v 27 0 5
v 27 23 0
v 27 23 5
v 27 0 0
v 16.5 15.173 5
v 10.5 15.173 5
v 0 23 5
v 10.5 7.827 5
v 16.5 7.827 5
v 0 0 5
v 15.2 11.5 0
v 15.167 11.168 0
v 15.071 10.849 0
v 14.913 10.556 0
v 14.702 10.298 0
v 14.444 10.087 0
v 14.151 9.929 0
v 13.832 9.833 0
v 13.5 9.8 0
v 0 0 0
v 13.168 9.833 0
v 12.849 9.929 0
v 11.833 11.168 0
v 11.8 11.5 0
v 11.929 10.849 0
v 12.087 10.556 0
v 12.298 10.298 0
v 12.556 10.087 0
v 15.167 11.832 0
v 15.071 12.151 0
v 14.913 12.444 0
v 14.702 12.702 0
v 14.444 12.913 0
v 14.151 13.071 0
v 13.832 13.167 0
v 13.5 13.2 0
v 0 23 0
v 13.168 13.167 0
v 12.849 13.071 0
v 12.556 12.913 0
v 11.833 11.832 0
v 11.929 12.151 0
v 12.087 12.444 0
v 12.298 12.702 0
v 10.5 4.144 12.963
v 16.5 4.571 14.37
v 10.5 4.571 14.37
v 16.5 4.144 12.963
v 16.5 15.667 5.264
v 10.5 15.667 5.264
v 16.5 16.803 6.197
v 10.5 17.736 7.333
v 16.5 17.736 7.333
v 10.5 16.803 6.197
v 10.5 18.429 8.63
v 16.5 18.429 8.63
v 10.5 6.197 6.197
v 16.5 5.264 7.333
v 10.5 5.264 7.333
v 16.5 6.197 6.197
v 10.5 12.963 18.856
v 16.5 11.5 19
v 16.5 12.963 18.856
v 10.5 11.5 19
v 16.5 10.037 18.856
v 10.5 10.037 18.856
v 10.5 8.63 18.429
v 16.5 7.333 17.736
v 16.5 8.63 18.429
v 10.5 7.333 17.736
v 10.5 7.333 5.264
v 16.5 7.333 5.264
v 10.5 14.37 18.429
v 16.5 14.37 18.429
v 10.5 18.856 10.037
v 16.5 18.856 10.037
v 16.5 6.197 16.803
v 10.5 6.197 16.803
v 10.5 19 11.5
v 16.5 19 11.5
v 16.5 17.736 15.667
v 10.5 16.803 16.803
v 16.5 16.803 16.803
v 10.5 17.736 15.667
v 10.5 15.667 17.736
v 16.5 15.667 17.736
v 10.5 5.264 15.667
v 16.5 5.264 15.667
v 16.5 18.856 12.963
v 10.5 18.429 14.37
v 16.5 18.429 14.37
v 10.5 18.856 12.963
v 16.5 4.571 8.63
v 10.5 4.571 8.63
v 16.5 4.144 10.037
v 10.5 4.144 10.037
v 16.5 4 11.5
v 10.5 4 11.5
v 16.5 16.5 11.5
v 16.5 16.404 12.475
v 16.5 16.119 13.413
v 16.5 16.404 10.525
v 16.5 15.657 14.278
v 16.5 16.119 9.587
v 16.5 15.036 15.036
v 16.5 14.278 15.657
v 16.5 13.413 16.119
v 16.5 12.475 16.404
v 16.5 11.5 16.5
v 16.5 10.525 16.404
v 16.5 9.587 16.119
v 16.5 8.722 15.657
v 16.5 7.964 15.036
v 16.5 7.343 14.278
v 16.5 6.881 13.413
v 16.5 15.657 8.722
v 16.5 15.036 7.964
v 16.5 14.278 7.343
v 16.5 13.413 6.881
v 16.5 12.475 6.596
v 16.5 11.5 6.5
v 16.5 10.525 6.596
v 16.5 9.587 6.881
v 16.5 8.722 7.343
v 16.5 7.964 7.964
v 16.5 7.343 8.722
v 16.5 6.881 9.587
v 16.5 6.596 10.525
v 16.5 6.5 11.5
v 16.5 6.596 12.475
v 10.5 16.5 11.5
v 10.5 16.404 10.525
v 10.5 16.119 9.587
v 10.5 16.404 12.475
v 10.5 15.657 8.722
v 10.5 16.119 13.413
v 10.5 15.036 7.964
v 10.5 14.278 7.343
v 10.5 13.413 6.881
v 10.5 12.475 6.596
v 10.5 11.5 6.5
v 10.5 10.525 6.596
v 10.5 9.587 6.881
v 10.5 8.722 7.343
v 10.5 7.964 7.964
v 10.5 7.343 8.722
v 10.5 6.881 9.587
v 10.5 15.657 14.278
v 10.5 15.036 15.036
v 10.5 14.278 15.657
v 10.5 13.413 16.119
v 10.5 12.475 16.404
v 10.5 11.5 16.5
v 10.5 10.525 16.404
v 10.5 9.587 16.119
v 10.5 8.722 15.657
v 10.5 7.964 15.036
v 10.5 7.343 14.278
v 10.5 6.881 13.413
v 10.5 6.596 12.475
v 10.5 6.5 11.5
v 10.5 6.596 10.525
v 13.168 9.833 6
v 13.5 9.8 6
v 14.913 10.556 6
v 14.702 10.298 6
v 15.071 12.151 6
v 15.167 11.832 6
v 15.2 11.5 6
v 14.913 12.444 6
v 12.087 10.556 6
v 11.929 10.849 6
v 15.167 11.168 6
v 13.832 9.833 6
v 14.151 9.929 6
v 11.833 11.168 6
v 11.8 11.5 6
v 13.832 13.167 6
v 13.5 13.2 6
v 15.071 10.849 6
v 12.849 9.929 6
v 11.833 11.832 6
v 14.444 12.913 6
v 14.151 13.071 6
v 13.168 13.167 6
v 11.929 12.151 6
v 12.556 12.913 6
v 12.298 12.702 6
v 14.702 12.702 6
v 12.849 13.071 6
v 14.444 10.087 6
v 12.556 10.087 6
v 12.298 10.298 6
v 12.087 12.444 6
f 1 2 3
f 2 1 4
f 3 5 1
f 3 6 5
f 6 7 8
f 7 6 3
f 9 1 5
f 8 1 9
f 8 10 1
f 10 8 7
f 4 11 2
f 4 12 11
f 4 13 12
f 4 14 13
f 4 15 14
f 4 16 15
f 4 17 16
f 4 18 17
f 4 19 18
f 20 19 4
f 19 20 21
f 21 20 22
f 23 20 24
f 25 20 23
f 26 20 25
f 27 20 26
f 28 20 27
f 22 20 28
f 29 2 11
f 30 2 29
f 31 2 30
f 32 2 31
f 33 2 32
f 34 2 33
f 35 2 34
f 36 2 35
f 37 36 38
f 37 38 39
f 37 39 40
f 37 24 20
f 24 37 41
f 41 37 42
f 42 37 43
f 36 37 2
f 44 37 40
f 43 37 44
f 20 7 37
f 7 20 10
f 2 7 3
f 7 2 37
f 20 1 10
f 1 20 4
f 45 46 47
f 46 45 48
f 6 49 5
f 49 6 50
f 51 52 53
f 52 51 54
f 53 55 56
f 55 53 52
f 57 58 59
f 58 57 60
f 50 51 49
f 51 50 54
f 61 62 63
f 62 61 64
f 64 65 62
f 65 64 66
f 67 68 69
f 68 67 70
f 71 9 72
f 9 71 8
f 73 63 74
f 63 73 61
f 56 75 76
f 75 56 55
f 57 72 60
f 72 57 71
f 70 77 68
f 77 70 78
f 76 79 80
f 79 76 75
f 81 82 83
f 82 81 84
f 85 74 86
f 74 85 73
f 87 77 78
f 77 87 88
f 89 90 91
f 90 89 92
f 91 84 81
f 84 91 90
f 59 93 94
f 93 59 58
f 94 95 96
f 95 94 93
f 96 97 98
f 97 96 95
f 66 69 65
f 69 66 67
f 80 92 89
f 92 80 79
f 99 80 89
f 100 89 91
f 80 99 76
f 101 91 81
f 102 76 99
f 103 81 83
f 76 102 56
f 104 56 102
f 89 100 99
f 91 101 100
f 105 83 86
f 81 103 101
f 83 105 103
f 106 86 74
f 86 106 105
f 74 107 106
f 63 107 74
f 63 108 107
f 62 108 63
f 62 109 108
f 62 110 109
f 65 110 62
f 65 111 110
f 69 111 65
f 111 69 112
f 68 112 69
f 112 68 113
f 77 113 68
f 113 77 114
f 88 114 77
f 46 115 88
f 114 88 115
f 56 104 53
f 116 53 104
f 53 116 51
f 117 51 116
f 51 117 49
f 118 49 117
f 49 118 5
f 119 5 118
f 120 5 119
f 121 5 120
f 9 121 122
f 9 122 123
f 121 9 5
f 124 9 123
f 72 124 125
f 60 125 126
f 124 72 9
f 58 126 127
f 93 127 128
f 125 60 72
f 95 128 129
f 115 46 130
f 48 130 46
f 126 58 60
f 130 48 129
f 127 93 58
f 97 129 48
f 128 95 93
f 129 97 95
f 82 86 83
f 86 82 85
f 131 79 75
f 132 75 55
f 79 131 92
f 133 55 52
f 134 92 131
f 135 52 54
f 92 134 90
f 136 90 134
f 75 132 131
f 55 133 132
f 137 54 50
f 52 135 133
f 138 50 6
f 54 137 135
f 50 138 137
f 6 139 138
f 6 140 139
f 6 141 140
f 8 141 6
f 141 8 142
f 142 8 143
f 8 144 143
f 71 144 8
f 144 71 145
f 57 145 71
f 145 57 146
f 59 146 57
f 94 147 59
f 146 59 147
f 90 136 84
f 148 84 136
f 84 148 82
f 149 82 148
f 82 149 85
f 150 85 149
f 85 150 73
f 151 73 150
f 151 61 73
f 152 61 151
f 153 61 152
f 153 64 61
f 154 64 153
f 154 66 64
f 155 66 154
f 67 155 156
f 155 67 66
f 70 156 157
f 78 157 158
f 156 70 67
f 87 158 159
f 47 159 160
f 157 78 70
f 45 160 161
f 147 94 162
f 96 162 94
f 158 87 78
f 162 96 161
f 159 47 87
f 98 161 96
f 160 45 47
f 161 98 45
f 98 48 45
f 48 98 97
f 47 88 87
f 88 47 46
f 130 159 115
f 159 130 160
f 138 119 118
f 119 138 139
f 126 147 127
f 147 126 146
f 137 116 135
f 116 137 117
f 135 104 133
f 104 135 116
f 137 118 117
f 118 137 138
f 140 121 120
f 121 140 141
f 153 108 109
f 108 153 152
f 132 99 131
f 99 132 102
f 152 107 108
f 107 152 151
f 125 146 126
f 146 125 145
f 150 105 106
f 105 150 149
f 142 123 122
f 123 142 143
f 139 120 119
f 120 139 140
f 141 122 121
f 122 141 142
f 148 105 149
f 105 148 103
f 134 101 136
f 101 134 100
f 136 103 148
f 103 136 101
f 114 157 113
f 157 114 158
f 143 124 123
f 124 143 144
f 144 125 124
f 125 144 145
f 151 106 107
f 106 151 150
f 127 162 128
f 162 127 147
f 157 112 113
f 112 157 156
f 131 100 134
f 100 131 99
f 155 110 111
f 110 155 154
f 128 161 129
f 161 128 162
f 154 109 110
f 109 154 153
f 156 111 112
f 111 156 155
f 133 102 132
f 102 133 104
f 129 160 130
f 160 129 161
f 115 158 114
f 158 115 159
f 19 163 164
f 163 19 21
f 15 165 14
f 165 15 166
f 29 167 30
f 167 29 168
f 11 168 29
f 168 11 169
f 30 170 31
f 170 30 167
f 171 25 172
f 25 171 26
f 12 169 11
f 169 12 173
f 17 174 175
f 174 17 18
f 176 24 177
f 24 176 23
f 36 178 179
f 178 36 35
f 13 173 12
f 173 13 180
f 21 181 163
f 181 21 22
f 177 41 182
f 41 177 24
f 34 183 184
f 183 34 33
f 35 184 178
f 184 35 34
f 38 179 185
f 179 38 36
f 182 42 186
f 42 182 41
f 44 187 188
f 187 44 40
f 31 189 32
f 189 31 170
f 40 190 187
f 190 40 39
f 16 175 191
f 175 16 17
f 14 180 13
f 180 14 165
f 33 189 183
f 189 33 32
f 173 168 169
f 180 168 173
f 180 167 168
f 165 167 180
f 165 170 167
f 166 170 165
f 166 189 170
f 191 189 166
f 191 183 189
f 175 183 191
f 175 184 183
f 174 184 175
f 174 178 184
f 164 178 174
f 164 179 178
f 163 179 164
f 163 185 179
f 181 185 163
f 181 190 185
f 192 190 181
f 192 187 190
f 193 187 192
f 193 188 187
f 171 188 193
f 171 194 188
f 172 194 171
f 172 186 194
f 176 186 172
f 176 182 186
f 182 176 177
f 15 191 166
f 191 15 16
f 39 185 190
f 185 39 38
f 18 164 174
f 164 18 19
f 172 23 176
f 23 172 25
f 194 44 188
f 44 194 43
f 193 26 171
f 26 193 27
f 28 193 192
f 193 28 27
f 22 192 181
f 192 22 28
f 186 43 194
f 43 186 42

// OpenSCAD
$fn = 32;

// ----------------------------------------------------------------------
// Cable clip: cable 10 mm, clamp 15 mm, base 27 mm
// ----------------------------------------------------------------------

// --- parameters (mm) ---
plate_x = 27;             // base length, X
plate_y = 23;             // base width, Y
plate_t = 5;              // base thickness
wire_seat_d = 15;         // clamp outside diameter
clip_t = 2.5;             // clamp wall
cable_d = 10;             // cable opening
ring_w = 6;               // clamp width along the cable
screw_d = 3.4;            // screw clearance
sink = 1;                 // overlap of the clamp into the base

module base() {
  cube([plate_x, plate_y, plate_t]);
}

module clamp() {
  translate([plate_x / 2, plate_y / 2, plate_t + wire_seat_d / 2 - sink]) rotate([0, 90, 0])
    cylinder(h = ring_w, d = wire_seat_d, center = true);
}

difference() {
  union() {
    base();
    clamp();
  }
  translate([plate_x / 2, plate_y / 2, plate_t + wire_seat_d / 2 - sink]) rotate([0, 90, 0]) translate([0, 0, -ring_w / 2 - 1]) cylinder(h = ring_w + 2, d = cable_d);
  translate([13.5, plate_y / 2, -1]) cylinder(h = plate_t + 2, d = screw_d);
}
